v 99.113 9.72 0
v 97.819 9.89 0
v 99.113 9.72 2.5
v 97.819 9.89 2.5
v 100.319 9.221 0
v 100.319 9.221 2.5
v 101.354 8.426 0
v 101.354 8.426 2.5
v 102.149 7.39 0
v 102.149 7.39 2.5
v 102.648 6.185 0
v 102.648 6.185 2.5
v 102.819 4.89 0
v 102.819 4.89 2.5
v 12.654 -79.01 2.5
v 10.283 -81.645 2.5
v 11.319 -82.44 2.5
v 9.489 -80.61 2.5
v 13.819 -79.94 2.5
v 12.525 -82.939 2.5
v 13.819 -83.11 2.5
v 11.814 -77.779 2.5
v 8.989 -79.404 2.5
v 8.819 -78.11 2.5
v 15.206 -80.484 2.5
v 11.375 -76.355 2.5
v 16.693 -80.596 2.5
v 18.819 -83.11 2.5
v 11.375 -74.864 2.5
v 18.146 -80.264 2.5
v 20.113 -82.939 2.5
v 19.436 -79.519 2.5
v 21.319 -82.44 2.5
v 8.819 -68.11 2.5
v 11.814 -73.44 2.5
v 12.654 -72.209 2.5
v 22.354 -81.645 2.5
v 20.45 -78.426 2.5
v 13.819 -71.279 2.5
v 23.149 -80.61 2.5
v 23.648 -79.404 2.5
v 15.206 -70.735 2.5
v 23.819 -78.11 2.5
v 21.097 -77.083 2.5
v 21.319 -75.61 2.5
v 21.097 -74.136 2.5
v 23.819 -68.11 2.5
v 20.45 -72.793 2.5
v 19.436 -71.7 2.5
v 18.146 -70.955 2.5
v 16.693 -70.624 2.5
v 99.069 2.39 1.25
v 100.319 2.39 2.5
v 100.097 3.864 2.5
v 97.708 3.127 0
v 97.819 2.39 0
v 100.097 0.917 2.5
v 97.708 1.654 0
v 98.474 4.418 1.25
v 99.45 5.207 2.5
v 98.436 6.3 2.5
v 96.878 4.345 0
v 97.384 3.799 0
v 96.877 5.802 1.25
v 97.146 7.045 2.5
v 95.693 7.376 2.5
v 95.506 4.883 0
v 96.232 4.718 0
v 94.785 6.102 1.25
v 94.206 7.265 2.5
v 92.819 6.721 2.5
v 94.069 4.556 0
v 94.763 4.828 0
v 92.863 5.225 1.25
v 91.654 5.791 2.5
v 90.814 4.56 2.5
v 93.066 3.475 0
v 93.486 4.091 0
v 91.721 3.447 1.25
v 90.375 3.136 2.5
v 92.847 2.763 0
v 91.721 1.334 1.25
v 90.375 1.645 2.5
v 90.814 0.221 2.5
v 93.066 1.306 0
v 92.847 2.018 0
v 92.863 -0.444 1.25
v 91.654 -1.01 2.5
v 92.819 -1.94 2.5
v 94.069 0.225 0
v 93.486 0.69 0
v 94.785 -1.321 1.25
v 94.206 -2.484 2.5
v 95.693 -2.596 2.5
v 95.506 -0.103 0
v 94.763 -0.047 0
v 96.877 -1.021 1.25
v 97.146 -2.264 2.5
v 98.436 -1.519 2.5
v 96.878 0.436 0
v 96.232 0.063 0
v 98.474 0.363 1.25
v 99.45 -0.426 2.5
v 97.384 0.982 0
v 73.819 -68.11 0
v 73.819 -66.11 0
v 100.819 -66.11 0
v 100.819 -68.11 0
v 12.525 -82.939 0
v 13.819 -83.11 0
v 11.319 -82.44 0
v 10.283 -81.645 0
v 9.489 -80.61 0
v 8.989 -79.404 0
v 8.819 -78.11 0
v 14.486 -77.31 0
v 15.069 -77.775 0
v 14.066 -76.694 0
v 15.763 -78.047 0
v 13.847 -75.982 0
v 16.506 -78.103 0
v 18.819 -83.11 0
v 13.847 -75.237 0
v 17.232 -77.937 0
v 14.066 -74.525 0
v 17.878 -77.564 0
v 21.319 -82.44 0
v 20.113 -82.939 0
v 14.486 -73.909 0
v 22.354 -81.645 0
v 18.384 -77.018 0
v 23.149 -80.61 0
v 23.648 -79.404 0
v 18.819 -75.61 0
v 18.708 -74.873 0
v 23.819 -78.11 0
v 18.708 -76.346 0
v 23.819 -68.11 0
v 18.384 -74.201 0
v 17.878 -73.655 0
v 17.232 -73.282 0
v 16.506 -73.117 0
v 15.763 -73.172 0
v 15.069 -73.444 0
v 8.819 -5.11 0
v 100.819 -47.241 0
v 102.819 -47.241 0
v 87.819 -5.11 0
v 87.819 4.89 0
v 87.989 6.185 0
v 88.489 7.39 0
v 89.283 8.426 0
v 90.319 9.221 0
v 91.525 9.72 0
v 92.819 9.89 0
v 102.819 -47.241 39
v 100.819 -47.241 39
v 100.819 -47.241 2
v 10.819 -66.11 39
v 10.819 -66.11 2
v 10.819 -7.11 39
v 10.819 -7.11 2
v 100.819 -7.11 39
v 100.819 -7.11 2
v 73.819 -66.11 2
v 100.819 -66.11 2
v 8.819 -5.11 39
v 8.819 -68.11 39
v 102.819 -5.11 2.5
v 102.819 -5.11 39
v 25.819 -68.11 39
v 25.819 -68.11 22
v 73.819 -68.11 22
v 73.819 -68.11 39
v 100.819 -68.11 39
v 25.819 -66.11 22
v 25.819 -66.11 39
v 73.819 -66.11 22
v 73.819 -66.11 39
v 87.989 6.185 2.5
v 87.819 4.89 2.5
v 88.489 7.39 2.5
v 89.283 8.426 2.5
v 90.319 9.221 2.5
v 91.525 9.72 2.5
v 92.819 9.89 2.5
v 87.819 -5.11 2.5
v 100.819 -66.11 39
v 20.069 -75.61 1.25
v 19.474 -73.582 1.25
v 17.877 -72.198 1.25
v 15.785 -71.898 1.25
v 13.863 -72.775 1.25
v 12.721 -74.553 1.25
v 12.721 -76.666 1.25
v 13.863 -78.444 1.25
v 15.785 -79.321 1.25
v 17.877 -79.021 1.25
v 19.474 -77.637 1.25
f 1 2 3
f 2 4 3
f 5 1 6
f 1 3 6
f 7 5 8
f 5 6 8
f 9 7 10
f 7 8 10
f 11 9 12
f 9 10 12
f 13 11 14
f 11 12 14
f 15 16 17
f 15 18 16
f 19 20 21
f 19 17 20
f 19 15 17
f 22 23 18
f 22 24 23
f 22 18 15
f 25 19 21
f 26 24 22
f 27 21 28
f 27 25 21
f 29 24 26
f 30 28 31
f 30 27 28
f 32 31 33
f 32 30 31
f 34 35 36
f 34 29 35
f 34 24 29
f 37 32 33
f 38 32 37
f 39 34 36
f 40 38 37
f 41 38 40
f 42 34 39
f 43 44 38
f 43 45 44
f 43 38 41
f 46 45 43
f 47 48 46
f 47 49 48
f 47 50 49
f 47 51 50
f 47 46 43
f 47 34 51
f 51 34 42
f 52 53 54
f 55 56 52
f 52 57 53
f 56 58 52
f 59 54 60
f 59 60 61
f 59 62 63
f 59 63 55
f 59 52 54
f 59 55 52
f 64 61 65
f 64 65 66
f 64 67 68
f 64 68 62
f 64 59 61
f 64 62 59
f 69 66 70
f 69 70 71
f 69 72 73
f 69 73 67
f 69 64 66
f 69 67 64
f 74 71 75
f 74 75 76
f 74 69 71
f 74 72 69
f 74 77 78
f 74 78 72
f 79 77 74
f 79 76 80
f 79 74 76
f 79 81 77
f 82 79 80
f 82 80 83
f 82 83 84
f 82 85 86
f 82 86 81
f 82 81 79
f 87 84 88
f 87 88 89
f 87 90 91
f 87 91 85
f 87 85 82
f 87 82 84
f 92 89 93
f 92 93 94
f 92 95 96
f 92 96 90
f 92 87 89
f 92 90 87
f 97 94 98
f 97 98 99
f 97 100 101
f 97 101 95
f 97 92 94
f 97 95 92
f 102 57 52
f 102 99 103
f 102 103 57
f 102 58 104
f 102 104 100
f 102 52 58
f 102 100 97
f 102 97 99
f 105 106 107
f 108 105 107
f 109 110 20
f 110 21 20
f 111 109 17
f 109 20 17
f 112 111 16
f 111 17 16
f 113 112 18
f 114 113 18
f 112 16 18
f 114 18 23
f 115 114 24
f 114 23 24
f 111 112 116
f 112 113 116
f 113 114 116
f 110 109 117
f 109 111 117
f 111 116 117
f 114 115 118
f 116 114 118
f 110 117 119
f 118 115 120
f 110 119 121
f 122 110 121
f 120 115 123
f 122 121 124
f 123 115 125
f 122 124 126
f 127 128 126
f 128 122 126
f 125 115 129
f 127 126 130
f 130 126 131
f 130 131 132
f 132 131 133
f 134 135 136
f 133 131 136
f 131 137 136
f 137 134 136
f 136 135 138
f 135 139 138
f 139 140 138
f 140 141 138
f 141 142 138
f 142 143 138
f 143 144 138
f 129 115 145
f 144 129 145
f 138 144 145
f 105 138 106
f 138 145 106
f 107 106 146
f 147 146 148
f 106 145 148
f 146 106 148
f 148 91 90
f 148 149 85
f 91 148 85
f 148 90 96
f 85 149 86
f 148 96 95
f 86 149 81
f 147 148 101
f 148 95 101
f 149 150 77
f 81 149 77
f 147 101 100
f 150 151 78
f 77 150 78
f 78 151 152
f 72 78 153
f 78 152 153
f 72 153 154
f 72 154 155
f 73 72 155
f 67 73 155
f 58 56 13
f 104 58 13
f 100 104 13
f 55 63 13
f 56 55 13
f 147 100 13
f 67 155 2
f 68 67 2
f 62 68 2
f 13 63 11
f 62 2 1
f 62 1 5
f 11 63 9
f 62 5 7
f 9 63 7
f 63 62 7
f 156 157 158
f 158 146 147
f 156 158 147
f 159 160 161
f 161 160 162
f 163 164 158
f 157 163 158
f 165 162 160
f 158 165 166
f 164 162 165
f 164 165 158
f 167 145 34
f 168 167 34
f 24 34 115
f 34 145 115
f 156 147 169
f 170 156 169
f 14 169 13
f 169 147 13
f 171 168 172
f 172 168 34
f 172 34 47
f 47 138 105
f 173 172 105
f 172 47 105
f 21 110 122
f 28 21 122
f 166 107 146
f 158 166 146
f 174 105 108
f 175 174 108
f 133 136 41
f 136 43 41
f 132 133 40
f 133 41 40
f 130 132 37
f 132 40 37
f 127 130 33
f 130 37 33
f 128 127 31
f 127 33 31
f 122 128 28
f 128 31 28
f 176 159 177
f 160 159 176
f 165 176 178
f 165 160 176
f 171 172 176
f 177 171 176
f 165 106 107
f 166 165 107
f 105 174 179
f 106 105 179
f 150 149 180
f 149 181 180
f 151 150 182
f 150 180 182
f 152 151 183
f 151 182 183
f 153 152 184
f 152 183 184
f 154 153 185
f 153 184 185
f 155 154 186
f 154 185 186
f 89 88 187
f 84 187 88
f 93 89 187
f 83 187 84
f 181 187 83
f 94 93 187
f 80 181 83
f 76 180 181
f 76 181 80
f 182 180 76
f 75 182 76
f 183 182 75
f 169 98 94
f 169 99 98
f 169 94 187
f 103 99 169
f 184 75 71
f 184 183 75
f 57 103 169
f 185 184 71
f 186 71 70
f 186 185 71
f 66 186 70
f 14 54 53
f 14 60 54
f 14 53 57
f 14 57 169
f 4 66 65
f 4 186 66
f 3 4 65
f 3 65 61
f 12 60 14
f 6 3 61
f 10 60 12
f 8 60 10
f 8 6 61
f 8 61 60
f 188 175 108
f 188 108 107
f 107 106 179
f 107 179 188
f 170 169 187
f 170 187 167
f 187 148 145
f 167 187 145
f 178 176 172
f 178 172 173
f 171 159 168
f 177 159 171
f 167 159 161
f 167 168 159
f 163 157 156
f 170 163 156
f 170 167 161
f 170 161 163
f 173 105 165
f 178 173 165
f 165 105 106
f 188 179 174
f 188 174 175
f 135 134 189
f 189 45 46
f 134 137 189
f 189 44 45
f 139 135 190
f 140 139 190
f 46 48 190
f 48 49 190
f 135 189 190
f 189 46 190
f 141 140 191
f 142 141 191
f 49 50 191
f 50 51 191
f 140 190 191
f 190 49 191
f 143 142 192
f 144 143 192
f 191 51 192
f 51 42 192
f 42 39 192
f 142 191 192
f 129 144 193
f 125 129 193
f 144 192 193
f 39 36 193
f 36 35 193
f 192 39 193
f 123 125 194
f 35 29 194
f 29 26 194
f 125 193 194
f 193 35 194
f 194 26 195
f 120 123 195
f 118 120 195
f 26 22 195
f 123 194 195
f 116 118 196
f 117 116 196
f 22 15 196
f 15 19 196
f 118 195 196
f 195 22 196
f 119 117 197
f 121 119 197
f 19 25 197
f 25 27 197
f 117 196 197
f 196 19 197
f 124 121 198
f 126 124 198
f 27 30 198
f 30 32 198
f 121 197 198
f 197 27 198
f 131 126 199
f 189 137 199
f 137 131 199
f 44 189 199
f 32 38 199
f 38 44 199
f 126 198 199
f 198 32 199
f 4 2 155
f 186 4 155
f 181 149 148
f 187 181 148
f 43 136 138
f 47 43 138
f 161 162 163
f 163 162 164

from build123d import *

# Parameters (mm, degrees)
F1_DEPTH = 39
F0_W     = 27
F0_H     = 2
F0_W_2   = 48
F2_DEPTH = 22
F3_DEPTH = 2
F0_R     = 2
F4_DEPTH = 2.5
F6_R     = 5


# Not quite as in the source:
# - a fillet or chamfer that OpenCascade refuses, or shapes differently, is made with other operations: its cross-section is extruded or revolved along the edge and cut away or added


with BuildPart() as f1:
    # F0 (on Top) → F1 (new body)
    with BuildSketch(Plane.XY):
        Polygon((10.8188620284, -66.1095576286), (10.8188620284, -7.1095576286), (100.8188620284, -7.1095576286), (100.8188620284, -47.2407341003), (102.8188620284, -47.2407341003), (102.8188620284, -7.5), (102.8188620284, -7.1095576286), (102.8188620284, -5.1095576286), (100.8188620284, -5.1095576286), (87.8188620284, -5.1095576286), (10.8188620284, -5.1095576286), (8.8188620284, -5.1095576286), (8.8188620284, -68.1095576286), (10.8188620284, -68.1095576286), (23.8188620284, -68.1095576286), (25.8188620284, -68.1095576286), (25.8188620284, -66.1095576286), align=None)
    extrude(amount=F1_DEPTH)

    # F0 (on Top) → F2 (join)
    with BuildSketch(Plane.XY):
        with Locations((49.8188620284, -67.1095576286)):
            Rectangle(F0_W_2, F0_H)
    extrude(amount=F2_DEPTH)

    # F0 (on Top) → F3 (join)
    with BuildSketch(Plane.XY):
        Polygon((100.8188620284, -7.1095576286), (10.8188620284, -7.1095576286), (10.8188620284, -66.1095576286), (25.8188620284, -66.1095576286), (73.8188620284, -66.1095576286), (100.8188620284, -66.1095576286), (100.8188620284, -47.2407341003), align=None)
    extrude(amount=F3_DEPTH)

    # F0 (on Top) → F4 (join)
    with BuildSketch(Plane.XY):
        Polygon((23.8188620284, -83.1095576286), (23.8188620284, -68.1095576286), (10.8188620284, -68.1095576286), (8.8188620284, -68.1095576286), (8.8188620284, -83.1095576286), align=None)
        with Locations((16.3188620284, -75.6095576286)):
            Circle(F0_R, mode=Mode.SUBTRACT)
        Polygon((100.8188620284, -5.1095576286), (102.8188620284, -5.1095576286), (102.8188620284, 9.8904423714), (87.8188620284, 9.8904423714), (87.8188620284, -5.1095576286), align=None)
        with Locations((95.3188620284, 2.3904423714)):
            Circle(F0_R, mode=Mode.SUBTRACT)
    extrude(amount=F4_DEPTH)

    # F5: chamfer of 3 on 2 edges, made by hand

    # F5_s1 → F5_t2 (revolve, cut)
    with BuildSketch(Plane.XZ.offset(75.6095576286)):
        Polygon((18.3188620284, -0.5), (21.3188620284, 2.5), (18.3188620284, 2.5), align=None)
    revolve(axis=Axis((16.3188620284, -75.6095576286, 2.5), (0, 0, 1)), mode=Mode.SUBTRACT)

    # F5_s3 → F5_t4 (revolve, cut)
    with BuildSketch(Plane.XZ.offset(-2.3904423714)):
        Polygon((100.3188620284, 2.5), (97.3188620284, -0.5), (97.3188620284, 2.5), align=None)
    revolve(axis=Axis((95.3188620284, 2.3904423714, 2.5), (0, 0, 1)), mode=Mode.SUBTRACT)

    # F6
    f6_edges = [f1.edges().sort_by_distance(p)[0] for p in [
        (102.818862, 9.890442, 1.25),
        (87.818862, 9.890442, 1.25),
        (8.818862, -83.109558, 1.25),
        (23.818862, -83.109558, 1.25),
    ]]
    fillet(f6_edges, radius=F6_R)


with BuildPart() as f1b:
    # F0 (on Top) → F1, piece 2 (new body)
    with BuildSketch(Plane.XY):
        with Locations((87.3188620284, -67.1095576286)):
            Rectangle(F0_W, F0_H)
    extrude(amount=F1_DEPTH)


solid = Compound([f1.part, f1b.part])
